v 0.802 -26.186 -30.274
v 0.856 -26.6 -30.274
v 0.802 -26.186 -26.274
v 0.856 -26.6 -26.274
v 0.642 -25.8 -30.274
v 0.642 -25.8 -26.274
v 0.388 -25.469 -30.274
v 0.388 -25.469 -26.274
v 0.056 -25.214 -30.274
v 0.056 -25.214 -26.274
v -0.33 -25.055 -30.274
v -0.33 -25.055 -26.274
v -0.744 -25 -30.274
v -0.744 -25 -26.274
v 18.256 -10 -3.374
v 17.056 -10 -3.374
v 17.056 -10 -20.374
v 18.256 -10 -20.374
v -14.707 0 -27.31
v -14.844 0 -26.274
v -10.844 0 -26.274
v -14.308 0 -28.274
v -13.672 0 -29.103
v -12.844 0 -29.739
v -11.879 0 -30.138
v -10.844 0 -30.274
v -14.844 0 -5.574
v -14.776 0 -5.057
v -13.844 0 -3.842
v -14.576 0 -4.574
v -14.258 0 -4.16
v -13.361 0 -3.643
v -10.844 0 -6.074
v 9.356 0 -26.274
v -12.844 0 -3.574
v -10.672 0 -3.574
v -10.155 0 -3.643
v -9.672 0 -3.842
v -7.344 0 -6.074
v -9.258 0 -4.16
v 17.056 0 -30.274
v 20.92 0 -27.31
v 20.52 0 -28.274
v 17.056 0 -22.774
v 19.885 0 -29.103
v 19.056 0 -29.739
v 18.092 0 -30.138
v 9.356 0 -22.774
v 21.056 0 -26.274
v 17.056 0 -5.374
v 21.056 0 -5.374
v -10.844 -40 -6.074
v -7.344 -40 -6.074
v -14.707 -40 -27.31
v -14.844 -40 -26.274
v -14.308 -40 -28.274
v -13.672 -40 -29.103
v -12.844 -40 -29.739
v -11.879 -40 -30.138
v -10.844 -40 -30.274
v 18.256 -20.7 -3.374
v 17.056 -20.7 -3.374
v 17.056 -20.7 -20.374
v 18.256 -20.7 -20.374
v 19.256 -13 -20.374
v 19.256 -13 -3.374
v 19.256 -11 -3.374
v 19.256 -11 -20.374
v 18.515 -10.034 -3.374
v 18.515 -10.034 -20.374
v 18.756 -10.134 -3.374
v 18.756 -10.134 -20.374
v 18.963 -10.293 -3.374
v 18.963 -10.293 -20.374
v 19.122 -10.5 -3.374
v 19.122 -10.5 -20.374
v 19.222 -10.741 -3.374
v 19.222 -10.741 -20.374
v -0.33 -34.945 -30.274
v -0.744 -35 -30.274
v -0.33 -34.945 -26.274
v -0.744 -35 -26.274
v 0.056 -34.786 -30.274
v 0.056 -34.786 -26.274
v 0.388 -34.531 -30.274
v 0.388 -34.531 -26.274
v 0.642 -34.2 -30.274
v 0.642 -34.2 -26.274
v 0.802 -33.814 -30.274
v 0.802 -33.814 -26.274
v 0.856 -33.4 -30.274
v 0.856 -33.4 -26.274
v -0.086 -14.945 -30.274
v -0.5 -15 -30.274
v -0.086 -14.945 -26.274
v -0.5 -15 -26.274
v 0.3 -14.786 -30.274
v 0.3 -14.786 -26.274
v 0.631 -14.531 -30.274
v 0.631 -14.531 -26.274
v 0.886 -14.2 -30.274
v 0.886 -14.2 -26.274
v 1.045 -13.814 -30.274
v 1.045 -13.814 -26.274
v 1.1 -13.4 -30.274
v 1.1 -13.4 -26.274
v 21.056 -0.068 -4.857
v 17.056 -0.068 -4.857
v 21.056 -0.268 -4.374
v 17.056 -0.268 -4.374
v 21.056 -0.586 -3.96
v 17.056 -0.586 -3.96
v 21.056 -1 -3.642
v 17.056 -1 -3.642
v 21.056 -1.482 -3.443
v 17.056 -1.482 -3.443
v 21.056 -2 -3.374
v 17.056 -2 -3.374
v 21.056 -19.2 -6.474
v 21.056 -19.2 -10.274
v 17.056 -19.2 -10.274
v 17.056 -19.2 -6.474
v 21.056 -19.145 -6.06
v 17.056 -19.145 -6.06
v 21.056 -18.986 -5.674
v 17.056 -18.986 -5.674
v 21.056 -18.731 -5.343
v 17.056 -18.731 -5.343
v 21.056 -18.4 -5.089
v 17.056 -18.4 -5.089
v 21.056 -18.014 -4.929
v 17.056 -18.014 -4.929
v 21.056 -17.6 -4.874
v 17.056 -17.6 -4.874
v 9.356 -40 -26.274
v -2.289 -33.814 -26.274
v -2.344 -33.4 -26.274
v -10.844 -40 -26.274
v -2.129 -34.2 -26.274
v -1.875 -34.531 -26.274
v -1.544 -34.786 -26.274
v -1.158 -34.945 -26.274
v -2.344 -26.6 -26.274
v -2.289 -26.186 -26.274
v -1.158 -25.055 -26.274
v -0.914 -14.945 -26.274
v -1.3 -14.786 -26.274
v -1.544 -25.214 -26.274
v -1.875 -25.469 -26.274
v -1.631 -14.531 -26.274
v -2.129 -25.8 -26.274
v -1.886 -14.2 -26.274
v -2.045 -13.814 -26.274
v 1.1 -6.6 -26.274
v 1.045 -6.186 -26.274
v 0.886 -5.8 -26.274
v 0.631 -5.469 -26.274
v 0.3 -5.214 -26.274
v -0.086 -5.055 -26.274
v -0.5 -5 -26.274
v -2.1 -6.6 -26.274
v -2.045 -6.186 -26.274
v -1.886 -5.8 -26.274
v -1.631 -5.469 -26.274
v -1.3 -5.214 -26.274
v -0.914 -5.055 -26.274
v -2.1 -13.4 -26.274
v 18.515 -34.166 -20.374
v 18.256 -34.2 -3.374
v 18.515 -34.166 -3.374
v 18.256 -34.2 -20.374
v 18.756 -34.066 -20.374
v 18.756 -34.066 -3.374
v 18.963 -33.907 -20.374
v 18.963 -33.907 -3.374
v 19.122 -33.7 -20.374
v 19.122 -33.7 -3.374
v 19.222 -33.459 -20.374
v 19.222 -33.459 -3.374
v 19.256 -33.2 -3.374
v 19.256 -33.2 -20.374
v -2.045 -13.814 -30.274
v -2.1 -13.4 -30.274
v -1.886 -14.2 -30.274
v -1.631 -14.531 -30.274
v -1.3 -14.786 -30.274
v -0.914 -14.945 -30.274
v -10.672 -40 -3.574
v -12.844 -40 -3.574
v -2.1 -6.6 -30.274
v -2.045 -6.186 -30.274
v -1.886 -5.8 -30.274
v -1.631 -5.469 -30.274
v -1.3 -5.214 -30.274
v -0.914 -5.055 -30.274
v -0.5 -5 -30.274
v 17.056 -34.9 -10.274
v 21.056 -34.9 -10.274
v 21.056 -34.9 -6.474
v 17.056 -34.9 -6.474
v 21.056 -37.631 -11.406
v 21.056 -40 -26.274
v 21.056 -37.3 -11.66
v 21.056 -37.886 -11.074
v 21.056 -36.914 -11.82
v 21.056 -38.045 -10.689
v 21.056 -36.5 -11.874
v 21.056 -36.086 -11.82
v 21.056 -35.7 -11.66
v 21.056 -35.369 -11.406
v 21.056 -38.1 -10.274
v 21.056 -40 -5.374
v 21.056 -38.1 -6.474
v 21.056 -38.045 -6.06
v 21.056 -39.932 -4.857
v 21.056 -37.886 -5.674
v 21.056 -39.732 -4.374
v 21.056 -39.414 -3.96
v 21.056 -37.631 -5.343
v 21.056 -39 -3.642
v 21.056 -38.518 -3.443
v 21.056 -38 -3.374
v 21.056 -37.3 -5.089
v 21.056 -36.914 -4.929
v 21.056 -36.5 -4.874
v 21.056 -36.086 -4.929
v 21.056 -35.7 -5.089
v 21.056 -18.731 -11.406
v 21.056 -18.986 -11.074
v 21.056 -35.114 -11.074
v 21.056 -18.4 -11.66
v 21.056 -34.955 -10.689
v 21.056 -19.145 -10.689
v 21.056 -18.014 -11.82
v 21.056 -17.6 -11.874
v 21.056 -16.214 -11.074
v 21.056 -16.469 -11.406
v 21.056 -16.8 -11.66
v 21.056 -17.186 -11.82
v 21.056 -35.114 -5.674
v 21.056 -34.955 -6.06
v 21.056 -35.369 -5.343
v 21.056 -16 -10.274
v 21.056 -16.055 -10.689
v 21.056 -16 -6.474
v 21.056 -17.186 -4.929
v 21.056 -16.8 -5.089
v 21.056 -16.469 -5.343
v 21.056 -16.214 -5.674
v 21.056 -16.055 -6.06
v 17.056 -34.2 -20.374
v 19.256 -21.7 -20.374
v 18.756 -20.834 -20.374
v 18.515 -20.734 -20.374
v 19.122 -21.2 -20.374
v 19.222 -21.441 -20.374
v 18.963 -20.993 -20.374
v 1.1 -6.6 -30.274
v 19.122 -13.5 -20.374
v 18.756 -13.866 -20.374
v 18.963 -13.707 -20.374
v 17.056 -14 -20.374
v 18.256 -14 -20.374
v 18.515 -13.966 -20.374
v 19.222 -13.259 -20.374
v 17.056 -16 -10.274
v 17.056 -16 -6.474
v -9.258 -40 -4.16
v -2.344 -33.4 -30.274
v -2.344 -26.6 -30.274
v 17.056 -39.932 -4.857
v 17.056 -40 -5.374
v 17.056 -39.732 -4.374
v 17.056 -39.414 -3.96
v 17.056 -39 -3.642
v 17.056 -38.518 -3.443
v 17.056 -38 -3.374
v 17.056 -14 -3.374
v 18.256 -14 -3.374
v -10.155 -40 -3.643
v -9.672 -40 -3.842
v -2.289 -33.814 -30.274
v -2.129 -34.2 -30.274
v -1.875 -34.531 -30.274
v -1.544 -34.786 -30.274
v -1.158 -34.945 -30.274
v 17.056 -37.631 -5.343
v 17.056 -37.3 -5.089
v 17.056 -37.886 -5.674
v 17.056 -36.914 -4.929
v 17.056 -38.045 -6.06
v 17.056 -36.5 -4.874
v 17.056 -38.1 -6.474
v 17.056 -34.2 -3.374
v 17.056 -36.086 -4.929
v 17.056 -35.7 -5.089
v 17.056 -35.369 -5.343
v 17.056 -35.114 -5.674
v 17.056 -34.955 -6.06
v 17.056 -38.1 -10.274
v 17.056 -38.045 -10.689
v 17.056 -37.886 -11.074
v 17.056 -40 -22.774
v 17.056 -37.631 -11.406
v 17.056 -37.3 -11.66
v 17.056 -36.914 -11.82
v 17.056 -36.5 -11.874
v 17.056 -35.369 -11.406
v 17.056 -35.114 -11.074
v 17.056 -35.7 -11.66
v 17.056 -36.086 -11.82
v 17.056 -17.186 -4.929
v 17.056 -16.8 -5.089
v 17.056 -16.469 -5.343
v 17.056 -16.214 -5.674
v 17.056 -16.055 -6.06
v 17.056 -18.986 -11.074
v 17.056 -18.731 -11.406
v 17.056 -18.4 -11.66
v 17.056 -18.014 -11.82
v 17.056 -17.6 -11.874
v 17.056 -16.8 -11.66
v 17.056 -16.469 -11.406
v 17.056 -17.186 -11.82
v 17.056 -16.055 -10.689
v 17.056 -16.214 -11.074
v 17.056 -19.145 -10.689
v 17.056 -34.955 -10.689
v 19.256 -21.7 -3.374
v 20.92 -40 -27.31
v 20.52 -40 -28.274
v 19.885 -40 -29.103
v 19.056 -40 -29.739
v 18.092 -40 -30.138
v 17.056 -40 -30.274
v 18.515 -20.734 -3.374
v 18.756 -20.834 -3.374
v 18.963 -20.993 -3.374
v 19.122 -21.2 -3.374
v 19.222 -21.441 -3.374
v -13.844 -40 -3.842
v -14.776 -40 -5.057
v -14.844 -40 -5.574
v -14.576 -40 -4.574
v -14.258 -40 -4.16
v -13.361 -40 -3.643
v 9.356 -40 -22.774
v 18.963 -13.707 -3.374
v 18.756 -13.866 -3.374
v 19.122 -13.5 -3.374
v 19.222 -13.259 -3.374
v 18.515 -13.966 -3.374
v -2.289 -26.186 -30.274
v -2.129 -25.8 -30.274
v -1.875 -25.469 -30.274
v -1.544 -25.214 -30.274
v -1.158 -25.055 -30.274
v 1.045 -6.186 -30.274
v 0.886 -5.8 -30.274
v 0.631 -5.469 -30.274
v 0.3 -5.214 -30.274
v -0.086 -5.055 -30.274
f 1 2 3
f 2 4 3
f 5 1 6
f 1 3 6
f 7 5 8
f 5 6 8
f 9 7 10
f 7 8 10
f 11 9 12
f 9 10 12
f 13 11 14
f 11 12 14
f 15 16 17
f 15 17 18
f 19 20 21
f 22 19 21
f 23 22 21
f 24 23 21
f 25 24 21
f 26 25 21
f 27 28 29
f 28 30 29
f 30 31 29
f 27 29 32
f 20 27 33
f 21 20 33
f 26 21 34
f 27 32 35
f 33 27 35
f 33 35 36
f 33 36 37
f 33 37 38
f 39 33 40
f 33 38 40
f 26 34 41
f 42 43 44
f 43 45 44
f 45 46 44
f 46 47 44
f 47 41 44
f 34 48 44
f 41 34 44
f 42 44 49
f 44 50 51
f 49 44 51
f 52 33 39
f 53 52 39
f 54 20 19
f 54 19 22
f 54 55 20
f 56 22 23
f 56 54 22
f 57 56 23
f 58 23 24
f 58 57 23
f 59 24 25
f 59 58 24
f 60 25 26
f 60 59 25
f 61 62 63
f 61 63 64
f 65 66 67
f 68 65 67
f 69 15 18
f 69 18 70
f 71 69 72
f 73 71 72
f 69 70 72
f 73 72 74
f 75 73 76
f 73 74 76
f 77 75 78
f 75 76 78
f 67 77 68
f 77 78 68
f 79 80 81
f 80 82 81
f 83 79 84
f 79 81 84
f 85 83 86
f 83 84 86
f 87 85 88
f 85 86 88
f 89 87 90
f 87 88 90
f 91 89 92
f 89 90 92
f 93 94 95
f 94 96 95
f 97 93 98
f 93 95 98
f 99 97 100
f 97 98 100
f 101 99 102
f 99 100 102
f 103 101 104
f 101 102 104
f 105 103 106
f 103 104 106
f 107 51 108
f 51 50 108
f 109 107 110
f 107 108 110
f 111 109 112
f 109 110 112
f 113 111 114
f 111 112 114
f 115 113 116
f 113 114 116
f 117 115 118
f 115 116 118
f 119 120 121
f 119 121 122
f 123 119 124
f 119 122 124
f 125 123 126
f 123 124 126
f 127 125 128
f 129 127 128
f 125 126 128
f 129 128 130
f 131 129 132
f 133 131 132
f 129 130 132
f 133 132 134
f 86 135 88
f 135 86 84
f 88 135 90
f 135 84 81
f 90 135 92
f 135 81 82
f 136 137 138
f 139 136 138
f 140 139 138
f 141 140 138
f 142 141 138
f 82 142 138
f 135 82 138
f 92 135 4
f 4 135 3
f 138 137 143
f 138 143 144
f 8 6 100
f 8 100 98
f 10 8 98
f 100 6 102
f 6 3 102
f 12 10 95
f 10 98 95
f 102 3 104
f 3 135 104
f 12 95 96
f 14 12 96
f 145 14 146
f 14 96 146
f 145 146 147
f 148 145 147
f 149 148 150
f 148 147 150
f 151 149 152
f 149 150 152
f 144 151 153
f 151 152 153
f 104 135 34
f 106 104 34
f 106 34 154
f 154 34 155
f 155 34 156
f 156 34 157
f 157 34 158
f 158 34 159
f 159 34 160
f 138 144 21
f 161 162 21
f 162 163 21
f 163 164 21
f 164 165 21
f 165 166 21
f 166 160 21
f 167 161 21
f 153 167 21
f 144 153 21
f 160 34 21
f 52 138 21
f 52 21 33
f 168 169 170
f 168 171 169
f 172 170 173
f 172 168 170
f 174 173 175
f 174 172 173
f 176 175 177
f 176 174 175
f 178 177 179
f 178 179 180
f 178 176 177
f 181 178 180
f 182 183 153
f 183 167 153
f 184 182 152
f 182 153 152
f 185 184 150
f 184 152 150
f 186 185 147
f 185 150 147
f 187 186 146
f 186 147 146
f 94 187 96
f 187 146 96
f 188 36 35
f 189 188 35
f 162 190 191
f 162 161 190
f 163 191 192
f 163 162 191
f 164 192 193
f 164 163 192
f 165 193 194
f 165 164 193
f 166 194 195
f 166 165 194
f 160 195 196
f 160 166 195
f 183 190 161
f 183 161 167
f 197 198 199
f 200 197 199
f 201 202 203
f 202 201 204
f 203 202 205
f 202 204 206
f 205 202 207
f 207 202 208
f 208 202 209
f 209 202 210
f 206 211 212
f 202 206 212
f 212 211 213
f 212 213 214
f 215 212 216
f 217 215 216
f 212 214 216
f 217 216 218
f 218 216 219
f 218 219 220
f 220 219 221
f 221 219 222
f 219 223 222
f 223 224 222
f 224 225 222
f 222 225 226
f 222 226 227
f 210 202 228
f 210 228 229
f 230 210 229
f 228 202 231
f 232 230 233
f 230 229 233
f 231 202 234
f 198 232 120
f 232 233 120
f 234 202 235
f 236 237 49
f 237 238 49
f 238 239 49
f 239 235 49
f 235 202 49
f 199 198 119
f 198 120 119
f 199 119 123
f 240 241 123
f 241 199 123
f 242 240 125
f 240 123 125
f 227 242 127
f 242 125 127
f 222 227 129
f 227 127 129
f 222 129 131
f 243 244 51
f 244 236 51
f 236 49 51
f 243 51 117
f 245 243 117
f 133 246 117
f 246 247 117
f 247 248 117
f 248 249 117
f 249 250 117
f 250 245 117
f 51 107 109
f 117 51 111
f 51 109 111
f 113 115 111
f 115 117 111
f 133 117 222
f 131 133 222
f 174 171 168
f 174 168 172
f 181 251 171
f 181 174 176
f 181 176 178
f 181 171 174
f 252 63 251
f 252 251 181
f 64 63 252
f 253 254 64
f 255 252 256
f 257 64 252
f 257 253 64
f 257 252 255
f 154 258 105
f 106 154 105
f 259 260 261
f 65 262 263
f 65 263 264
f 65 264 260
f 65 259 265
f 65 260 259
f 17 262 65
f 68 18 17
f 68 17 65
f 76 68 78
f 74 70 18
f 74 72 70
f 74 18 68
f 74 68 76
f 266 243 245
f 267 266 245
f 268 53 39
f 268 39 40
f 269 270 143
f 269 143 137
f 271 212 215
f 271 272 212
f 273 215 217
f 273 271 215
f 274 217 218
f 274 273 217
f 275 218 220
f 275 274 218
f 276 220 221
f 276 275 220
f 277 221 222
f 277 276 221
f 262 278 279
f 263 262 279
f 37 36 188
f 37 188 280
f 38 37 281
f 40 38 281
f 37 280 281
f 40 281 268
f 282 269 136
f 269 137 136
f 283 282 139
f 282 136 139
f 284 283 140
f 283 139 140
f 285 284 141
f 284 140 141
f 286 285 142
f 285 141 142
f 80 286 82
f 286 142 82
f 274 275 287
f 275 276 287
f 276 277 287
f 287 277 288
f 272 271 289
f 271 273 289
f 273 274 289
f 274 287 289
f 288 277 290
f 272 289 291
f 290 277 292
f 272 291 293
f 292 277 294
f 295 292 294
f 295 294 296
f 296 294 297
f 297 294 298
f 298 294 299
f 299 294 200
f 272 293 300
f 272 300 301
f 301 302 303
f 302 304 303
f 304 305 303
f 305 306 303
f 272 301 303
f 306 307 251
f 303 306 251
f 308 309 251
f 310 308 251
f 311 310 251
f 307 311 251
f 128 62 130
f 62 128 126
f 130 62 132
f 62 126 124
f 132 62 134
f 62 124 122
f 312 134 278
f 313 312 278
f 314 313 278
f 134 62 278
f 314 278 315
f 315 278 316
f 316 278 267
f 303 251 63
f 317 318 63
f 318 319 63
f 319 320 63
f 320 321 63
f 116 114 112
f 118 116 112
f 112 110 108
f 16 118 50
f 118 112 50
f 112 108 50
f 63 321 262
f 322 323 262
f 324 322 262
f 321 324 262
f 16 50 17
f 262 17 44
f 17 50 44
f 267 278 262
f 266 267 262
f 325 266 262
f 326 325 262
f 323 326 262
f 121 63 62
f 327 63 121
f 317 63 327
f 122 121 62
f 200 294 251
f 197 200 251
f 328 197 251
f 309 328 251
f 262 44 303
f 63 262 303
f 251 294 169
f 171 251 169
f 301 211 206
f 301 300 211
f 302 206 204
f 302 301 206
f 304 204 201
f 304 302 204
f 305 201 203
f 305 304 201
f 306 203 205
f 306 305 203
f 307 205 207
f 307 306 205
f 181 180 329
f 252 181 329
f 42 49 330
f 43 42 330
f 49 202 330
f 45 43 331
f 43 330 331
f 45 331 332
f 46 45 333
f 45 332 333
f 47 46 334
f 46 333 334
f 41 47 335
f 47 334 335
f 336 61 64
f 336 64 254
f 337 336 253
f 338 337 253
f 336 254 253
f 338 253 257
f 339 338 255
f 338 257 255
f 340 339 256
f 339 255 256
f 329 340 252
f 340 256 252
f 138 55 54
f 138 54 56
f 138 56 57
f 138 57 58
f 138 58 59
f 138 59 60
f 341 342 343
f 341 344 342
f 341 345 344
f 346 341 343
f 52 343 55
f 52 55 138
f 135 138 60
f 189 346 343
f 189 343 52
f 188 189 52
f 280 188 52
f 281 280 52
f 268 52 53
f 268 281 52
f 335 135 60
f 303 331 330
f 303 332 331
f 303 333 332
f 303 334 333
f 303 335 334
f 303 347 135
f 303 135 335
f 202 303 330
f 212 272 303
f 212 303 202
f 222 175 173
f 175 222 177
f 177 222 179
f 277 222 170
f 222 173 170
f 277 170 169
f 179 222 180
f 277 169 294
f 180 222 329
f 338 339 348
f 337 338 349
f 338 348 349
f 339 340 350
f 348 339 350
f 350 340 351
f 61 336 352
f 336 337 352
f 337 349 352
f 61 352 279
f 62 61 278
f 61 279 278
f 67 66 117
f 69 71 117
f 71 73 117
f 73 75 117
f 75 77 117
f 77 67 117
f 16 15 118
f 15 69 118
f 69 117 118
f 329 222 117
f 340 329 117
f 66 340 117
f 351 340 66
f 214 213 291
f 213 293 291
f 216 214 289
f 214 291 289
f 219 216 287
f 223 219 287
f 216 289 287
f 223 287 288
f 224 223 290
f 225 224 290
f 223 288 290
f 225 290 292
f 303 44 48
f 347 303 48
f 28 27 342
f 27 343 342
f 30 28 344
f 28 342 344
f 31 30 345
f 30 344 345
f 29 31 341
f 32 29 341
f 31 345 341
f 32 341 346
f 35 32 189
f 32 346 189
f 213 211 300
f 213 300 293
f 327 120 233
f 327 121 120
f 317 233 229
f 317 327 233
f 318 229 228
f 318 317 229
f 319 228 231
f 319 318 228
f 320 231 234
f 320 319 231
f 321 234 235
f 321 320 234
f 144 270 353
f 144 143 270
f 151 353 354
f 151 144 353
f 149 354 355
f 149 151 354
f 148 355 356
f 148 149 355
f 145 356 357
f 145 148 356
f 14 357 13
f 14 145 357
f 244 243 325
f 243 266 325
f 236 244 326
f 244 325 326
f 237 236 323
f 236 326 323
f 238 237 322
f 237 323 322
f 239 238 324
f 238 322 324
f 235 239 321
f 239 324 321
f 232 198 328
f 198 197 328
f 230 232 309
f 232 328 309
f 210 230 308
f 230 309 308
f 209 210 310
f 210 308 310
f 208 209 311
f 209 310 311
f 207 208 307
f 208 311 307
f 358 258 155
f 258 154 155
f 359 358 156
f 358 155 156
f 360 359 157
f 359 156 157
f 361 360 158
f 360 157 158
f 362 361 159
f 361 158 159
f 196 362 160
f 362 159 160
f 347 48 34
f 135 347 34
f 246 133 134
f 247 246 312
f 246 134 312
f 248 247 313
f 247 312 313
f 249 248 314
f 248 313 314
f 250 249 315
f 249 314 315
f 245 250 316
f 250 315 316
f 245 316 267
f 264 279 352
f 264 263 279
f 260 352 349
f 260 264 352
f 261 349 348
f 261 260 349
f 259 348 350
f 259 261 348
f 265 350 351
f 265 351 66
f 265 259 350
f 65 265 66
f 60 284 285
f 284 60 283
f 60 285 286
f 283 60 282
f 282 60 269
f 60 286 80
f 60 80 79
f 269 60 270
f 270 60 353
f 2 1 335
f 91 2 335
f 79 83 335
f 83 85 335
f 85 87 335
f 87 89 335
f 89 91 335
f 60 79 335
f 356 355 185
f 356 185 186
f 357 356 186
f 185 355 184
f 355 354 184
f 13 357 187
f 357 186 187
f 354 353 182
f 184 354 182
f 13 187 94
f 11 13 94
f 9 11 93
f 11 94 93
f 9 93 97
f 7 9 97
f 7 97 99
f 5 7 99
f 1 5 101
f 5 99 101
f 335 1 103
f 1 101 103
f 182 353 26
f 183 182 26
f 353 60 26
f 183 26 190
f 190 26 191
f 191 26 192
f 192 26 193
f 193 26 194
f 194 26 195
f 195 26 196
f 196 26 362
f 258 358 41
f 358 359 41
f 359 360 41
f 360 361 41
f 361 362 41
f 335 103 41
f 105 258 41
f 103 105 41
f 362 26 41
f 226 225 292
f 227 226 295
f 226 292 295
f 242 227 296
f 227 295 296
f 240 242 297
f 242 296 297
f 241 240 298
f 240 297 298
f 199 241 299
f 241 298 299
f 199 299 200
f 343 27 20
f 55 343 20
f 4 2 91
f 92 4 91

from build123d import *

# Parameters (mm, degrees)
F1_DEPTH  = 40
F2_R      = 4
F3_R      = 2
F4_W      = 3.2
F4_H      = 7
F5_DEPTH  = 4
F6_R      = 1.59999
F7_W      = 3.2
F7_H      = 10
F8_DEPTH  = 4
F9_R      = 1.59999
F10_W     = 2.2
F10_H     = 4
F10_H_2   = 13.5
F11_DEPTH = 17
F12_R     = 2
F13_R     = 1
F14_R     = 2


# Not quite as in the source:
# - a fillet or chamfer is up to 0.001 mm smaller than in the source, because OpenCascade refuses the exact size


with BuildPart() as f1:
    # F0 (on Front) → F1 (new body)
    with BuildSketch(Plane.XZ):
        Polygon((21.0562500745, -30.2744720221), (21.0562500745, -3.3744720221), (17.0562500745, -3.3744720221), (17.0562500745, -22.7744720221), (9.3562500745, -22.7744720221), (9.3562500745, -26.2744720221), (-10.8437499255, -26.2744720221), (-10.8437499255, -6.0744720221), (-7.3437499255, -6.0744720221), (-9.8437499255, -3.5744720221), (-14.8437499255, -3.5744720221), (-14.8437499255, -30.2744720221), align=None)
    extrude(amount=F1_DEPTH)

    # F2
    f2_edges = [f1.edges().sort_by_distance(p)[0] for p in [
        (-14.84375, -20, -30.274472),
        (21.05625, -20, -30.274472),
    ]]
    fillet(f2_edges, radius=F2_R)

    # F3
    f3_edges = [f1.edges().sort_by_distance(p)[0] for p in [
        (-9.84375, -20, -3.574472),
    ]]
    fillet(f3_edges, radius=F3_R)

    # F4 (on face) → F5 (cut, through all)
    with BuildSketch(Plane.YZ.offset(21.0562500745)):
        with Locations((-17.6, -8.3744720221)):
            Rectangle(F4_W, F4_H)
        with Locations((-36.5, -8.3744720221)):
            Rectangle(F4_W, F4_H)
    extrude(amount=-F5_DEPTH, mode=Mode.SUBTRACT)

    # F6 (radius 1.6 in the source; OpenCascade refuses exactly that, so slightly less here)
    f6_edges = [f1.edges().sort_by_distance(p)[0] for p in [
        (19.05625, -19.2, -4.874472),
        (19.05625, -16, -4.874472),
        (19.05625, -16, -11.874472),
        (19.05625, -19.2, -11.874472),
        (19.05625, -38.1, -11.874472),
        (19.05625, -34.9, -11.874472),
        (19.05625, -34.9, -4.874472),
        (19.05625, -38.1, -4.874472),
    ]]
    fillet(f6_edges, radius=F6_R)

    # F7 (on face) → F8 (cut, through all)
    with BuildSketch(Plane(origin=(0, 0, -30.2744720221), x_dir=(1, 0, 0), z_dir=(0, 0, -1))):
        with Locations((-0.500000006, 10)):
            Rectangle(F7_W, F7_H)
        with Locations((-0.7437499255, 30)):
            Rectangle(F7_W, F7_H)
    extrude(amount=-F8_DEPTH, mode=Mode.SUBTRACT)

    # F9 (radius 1.6 in the source; OpenCascade refuses exactly that, so slightly less here)
    f9_edges = [f1.edges().sort_by_distance(p)[0] for p in [
        (0.85625, -35, -28.274472),
        (-2.34375, -35, -28.274472),
        (-2.1, -15, -28.274472),
        (1.1, -15, -28.274472),
        (0.85625, -25, -28.274472),
        (1.1, -5, -28.274472),
        (-2.34375, -25, -28.274472),
        (-2.1, -5, -28.274472),
    ]]
    fillet(f9_edges, radius=F9_R)

    # F10 (on face) → F11 (cut)
    with BuildSketch(Plane.XY.offset(-3.3744720221)):
        with Locations((18.1562500745, -12)):
            Rectangle(F10_W, F10_H)
        with Locations((18.1562500745, -27.45)):
            Rectangle(F10_W, F10_H_2)
    extrude(amount=-F11_DEPTH, mode=Mode.SUBTRACT)

    # F12
    f12_edges = [f1.edges().sort_by_distance(p)[0] for p in [
        (19.05625, -40, -3.374472),
        (19.05625, 0, -3.374472),
    ]]
    fillet(f12_edges, radius=F12_R)

    # F13
    f13_edges = [f1.edges().sort_by_distance(p)[0] for p in [
        (19.25625, -14, -11.874472),
        (19.25625, -10, -11.874472),
        (19.25625, -20.7, -11.874472),
        (19.25625, -34.2, -11.874472),
    ]]
    fillet(f13_edges, radius=F13_R)

    # F14
    f14_edges = [f1.edges().sort_by_distance(p)[0] for p in [
        (-14.84375, -20, -3.574472),
    ]]
    fillet(f14_edges, radius=F14_R)


solid = f1.part
